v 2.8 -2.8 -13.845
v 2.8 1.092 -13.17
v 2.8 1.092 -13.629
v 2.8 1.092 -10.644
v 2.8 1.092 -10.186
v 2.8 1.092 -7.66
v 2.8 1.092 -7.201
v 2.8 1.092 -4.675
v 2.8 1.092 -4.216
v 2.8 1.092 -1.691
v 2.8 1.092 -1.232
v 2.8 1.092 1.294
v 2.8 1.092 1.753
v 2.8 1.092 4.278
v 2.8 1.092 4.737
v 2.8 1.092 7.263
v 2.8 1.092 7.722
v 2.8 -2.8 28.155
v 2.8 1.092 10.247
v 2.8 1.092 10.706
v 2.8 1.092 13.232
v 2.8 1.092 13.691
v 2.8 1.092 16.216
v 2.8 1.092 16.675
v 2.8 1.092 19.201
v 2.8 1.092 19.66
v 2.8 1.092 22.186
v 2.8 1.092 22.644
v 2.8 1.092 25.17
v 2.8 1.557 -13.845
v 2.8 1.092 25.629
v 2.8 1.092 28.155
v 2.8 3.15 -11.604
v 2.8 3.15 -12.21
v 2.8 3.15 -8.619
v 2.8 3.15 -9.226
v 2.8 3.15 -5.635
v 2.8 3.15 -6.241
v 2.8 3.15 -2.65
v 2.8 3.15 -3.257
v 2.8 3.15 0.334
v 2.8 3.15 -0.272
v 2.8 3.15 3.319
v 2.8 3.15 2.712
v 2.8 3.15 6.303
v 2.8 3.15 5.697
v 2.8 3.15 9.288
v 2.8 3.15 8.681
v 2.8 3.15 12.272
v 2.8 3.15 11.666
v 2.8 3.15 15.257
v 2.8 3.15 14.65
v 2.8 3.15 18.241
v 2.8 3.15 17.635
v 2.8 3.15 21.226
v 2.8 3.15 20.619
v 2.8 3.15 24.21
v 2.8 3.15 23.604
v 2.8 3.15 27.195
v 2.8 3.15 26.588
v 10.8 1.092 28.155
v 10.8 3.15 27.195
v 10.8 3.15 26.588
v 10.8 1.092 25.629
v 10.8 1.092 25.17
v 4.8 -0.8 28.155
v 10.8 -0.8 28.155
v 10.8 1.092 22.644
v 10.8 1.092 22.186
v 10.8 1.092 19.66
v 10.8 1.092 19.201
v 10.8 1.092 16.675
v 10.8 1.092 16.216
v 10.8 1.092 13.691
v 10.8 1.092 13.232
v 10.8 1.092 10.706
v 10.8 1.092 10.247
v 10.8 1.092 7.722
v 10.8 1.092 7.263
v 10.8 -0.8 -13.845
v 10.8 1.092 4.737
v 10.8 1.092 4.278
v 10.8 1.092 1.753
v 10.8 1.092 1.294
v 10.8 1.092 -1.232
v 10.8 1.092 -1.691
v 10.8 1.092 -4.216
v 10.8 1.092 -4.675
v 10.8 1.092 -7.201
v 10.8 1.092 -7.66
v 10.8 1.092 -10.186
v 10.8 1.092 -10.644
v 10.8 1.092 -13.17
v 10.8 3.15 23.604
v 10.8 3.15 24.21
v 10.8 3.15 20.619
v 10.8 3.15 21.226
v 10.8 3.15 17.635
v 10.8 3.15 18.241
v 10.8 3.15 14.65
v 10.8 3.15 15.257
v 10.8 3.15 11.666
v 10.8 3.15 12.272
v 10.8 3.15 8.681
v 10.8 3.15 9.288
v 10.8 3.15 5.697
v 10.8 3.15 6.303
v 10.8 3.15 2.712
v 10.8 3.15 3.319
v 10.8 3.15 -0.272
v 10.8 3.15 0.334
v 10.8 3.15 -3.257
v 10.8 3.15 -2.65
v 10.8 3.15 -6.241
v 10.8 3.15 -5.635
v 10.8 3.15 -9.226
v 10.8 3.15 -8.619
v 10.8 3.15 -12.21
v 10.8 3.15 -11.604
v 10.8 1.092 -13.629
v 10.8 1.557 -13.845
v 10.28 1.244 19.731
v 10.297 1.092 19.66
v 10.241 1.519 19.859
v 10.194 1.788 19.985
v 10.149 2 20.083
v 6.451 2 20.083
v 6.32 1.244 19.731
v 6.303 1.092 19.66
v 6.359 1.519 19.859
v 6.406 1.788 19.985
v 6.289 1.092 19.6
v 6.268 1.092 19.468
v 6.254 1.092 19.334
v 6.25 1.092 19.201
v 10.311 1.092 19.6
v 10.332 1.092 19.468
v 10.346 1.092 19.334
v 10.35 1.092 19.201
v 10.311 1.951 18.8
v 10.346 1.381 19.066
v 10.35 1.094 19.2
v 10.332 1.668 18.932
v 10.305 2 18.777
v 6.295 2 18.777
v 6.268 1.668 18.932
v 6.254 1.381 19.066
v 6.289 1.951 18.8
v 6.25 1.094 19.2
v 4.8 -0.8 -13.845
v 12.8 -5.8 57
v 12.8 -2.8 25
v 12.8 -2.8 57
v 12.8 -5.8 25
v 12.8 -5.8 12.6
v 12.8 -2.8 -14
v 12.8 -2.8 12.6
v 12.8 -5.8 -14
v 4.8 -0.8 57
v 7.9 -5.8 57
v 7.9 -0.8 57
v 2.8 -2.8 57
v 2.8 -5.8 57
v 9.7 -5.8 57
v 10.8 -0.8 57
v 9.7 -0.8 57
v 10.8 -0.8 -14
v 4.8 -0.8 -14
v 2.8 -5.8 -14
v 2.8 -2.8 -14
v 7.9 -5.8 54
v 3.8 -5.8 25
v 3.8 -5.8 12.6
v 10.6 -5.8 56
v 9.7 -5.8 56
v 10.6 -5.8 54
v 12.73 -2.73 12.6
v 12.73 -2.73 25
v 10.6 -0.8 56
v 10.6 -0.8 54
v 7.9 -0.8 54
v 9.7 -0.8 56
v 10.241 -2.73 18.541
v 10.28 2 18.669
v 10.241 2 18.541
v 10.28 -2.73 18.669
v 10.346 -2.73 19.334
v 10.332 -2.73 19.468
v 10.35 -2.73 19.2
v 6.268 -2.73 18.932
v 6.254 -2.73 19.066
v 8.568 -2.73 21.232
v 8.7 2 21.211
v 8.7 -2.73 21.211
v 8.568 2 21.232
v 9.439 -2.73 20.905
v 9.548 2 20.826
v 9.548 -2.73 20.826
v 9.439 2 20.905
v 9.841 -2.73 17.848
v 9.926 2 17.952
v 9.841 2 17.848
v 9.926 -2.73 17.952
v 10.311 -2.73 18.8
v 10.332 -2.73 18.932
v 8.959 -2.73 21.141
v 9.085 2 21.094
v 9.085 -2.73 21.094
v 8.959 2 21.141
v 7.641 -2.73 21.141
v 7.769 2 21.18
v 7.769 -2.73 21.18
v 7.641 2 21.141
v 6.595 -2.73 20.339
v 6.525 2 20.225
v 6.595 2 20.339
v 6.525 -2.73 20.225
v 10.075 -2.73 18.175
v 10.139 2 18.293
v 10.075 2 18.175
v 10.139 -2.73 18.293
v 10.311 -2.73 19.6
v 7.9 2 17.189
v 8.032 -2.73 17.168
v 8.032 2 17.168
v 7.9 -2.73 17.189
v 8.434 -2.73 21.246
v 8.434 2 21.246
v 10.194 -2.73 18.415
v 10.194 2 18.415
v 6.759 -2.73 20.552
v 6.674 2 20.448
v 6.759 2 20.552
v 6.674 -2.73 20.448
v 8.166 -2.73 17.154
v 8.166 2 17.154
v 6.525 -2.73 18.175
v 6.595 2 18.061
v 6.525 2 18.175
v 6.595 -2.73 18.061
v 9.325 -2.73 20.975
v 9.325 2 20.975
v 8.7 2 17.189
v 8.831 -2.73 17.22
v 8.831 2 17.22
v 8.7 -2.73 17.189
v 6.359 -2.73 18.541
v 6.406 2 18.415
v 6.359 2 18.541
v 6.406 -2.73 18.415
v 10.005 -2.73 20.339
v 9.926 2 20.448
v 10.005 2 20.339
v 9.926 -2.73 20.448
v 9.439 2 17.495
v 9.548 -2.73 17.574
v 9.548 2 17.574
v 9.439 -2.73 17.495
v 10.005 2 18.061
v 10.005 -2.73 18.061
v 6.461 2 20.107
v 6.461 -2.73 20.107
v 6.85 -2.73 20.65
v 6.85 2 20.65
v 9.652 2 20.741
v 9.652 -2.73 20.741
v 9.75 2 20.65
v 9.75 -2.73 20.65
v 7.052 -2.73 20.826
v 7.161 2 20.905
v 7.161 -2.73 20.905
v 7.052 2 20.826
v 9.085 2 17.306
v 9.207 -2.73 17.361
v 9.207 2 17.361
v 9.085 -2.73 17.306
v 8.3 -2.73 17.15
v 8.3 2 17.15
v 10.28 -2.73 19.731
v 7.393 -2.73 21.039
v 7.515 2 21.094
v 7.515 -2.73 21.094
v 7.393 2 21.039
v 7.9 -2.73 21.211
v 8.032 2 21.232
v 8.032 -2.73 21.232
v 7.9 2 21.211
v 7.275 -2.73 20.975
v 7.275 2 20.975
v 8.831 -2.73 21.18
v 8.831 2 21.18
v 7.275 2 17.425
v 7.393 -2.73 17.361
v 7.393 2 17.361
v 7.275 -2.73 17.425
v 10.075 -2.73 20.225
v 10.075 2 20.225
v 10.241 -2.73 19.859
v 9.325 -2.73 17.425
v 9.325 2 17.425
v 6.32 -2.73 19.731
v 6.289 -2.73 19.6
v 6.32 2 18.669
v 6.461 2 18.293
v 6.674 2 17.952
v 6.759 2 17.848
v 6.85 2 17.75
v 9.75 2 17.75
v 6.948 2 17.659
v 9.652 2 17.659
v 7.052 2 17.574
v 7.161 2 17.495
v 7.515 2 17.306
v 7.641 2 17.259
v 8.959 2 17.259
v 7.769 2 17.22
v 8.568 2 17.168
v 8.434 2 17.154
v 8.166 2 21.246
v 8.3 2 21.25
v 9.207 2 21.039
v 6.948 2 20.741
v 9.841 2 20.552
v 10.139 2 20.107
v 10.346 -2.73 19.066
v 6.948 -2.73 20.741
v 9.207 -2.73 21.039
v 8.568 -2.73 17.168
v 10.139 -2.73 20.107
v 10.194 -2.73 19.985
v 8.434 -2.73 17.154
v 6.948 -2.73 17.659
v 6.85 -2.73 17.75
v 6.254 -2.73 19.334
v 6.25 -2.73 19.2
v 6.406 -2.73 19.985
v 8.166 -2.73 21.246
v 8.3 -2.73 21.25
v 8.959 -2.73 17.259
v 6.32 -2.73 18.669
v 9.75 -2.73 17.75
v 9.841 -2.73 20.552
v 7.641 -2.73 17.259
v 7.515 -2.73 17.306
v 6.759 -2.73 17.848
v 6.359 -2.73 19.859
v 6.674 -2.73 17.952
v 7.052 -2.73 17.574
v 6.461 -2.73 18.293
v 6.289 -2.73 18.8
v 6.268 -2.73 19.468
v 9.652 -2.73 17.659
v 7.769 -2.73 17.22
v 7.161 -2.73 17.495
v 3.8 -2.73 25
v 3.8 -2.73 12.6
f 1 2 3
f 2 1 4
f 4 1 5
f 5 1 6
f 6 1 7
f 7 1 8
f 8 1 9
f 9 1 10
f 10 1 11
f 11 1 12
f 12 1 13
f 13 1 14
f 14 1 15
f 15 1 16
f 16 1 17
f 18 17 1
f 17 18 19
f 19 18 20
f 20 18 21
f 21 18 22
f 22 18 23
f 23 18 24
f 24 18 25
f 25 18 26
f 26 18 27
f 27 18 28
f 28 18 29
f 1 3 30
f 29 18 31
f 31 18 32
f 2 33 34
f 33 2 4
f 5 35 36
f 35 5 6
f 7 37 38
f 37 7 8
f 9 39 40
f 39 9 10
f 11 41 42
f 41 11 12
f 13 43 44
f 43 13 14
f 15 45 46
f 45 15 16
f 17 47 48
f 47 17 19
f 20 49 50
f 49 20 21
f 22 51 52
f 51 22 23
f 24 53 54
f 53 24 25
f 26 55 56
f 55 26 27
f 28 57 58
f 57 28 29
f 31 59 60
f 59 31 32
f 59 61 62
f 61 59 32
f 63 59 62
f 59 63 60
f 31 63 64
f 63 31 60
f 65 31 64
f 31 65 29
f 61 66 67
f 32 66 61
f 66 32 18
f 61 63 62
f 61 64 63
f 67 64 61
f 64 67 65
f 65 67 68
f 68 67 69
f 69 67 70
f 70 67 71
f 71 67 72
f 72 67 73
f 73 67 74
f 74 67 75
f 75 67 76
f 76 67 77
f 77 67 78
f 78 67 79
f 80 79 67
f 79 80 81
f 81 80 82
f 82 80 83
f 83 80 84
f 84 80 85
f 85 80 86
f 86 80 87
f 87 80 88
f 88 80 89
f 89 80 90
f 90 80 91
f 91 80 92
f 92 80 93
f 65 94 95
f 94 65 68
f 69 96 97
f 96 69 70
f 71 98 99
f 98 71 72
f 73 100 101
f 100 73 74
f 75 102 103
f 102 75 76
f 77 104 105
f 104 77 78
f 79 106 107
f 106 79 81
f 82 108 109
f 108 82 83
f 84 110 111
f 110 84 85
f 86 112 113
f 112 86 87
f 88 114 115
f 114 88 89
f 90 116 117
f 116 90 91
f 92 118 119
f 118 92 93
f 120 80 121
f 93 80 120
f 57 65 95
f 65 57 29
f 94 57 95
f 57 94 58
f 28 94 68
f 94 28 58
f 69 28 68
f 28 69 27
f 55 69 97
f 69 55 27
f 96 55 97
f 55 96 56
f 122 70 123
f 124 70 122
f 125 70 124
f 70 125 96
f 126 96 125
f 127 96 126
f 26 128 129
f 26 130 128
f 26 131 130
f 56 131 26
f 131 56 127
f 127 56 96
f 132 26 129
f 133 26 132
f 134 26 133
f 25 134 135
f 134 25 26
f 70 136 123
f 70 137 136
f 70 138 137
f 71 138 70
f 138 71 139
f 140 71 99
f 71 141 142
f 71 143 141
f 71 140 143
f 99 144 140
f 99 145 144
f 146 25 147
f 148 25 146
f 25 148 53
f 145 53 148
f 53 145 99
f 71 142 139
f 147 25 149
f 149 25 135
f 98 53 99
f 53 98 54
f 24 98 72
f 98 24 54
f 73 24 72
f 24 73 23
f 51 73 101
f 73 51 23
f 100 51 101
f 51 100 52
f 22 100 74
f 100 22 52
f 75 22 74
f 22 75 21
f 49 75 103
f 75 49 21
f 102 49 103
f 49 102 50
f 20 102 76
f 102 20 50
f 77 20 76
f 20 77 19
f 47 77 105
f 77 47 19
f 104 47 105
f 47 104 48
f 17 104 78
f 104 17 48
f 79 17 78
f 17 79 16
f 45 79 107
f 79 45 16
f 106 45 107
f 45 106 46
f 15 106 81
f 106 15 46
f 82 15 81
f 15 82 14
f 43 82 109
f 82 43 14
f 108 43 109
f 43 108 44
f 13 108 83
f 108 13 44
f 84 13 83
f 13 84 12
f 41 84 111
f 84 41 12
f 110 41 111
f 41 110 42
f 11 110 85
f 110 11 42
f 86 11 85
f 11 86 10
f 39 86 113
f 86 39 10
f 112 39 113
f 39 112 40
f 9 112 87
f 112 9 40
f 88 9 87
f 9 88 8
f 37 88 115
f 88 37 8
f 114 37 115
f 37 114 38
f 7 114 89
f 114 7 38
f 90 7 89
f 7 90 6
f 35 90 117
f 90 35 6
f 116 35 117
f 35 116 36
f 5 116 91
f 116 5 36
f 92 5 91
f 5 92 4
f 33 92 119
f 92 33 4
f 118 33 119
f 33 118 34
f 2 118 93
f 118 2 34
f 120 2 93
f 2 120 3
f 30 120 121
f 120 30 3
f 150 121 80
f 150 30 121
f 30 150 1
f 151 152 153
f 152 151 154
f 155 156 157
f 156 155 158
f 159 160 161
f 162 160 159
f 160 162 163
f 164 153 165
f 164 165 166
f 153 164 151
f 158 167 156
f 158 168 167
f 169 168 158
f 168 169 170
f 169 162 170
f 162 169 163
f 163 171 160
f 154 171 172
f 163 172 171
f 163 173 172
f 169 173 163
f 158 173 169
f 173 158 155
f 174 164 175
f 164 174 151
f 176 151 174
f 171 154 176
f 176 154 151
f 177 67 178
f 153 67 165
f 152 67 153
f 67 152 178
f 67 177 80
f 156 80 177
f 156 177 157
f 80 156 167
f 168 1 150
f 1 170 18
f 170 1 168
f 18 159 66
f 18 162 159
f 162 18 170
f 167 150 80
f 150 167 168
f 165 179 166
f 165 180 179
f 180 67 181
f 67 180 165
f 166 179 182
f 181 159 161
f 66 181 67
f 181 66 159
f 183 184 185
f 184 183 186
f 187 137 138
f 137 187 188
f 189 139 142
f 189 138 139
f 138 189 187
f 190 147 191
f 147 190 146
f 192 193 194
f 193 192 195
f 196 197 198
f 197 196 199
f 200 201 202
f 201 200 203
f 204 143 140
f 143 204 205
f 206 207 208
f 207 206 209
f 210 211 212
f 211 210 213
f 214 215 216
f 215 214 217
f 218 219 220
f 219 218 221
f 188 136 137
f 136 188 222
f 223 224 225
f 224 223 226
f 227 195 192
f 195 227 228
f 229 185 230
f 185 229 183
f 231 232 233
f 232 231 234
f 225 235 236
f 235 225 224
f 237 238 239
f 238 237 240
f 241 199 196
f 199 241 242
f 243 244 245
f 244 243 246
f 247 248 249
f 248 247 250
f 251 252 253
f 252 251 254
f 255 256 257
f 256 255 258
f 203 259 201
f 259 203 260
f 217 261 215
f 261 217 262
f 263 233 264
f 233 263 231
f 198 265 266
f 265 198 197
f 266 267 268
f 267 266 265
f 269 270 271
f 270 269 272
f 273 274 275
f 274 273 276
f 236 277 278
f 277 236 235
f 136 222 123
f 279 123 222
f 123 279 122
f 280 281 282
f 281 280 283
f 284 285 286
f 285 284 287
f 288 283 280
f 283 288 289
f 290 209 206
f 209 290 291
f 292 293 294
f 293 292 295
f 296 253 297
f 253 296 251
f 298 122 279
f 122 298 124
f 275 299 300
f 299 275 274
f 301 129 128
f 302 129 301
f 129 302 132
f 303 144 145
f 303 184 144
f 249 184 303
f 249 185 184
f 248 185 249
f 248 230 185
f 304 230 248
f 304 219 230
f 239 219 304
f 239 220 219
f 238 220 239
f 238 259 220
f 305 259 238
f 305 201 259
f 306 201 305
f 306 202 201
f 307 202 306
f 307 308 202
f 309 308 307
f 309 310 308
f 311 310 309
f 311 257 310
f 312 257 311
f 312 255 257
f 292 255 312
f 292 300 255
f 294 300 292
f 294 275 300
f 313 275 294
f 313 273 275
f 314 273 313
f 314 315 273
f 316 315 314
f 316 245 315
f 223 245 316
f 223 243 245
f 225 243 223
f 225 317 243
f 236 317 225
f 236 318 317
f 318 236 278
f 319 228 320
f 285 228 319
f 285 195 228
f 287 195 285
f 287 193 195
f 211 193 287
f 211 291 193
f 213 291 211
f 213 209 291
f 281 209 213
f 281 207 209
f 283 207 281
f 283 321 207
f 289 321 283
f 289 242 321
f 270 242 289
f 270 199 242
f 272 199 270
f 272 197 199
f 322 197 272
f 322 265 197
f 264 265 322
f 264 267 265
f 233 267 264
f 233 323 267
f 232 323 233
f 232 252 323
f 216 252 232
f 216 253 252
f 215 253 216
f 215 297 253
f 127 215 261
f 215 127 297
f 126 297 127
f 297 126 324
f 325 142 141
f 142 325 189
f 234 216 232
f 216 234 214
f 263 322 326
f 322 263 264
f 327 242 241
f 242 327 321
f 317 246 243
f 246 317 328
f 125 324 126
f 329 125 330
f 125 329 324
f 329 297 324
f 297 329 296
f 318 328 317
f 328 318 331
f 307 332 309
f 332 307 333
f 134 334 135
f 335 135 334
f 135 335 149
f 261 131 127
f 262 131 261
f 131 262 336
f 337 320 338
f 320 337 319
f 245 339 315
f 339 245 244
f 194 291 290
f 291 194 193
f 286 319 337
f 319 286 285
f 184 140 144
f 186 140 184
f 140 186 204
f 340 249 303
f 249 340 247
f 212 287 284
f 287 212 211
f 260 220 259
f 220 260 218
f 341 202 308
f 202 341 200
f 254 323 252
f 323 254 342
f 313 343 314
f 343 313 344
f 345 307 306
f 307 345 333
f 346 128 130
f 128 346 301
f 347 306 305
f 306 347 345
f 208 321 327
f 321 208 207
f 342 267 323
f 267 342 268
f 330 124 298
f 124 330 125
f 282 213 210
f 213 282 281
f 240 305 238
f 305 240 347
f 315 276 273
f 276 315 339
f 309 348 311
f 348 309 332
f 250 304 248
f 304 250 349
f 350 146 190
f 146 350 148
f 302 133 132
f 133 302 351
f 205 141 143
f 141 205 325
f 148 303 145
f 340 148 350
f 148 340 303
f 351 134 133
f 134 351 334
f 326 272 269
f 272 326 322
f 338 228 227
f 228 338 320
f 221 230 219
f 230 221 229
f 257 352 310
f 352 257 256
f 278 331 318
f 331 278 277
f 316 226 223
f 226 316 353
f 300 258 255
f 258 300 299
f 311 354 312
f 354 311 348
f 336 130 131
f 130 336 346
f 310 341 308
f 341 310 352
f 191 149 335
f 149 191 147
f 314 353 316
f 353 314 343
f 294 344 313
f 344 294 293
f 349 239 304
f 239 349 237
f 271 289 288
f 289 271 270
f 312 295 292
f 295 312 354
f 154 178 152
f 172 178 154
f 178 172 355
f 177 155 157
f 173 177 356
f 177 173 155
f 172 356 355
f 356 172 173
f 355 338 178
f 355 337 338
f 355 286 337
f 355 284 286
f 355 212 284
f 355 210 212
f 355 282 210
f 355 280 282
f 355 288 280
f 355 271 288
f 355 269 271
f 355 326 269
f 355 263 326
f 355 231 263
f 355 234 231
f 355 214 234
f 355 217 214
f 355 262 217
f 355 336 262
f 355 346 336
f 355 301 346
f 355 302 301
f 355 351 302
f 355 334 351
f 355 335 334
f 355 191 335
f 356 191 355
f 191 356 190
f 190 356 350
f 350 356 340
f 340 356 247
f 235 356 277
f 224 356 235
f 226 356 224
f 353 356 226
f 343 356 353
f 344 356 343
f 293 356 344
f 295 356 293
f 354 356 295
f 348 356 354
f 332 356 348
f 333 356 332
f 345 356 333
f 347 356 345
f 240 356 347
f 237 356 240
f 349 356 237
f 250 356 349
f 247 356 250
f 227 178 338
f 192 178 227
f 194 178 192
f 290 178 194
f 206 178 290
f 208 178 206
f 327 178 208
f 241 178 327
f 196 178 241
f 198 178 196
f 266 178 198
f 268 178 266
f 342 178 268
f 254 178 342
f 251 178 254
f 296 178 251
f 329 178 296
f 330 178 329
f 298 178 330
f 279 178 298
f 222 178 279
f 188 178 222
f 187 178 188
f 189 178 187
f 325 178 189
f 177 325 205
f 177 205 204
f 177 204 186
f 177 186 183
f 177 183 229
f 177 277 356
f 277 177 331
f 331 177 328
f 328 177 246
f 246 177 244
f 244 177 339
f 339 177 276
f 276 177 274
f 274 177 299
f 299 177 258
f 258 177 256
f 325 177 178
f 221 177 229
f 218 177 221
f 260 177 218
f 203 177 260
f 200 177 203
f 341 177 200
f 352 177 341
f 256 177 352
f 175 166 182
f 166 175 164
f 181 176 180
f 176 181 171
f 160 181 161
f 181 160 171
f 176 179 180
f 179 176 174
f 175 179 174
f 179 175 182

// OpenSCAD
$fn = 96;

// Redesigned and modified from https://www.thingiverse.com/thing:5719788
// Now available in OpenSCAD, for further modifications
// Gears from: https://www.thingiverse.com/thing:1604369
// Its mostly in german, but you should be ok...
// To Do:
// Implement gears as imported library

//color("DarkSlateGray") translate([-25,8,9.6]) rotate([90,0,90]) import("StepMotorModelScaled.stl");

//Z_rail ();
//Z_gearwheel ();
Z_rackpen (M3_insert); // M3_screwhole, M3_insert

//translate([25.5,-6.8+tight,18.5]) penHolder();
//translate([25.5,-6.8+tight,18.5]) brushInsert(6.5);
//handWheel();

//linear_extrude(32, center=true, scale=1) polygon(points=[[0,0],[2,2],[8,2],[10,0]]);


//color("fuchsia") translate([0,tight-0.2,15]) Z_rack ();
// Z-rack with mounatble penHolder
module Z_rackpen(lochli){
  translate([0,0,10]) difference(){
    color("fuchsia") translate([0,tight-0.2,15]) Z_rack ();
    #translate([dist+5.5,2,9.2]) rotate([90,0,0]) cylinder(21, d=lochli, center=false); // bigger hole for insert, uncomment if needed
    translate([dist+6,-6.68+tight,8.8]) cube([10,3.1,12.4], center = true); 
    translate([dist+6,-6.68+tight,50]) cube([1.8,18.1,12], center = true); 
    translate([dist+6.8,-6.68+tight,45]) cube([2.0,18.1,2], center = true); 
  }
}



// general shape of mechanism
round_edge = 4; // dont go more than 5
slide_tol = 0.6; // adjust this for tolerance
tight = 2.4; // Moves the rack closer to the wheel. Needs to be changed when gearwheel size changes
dist = 2.8; // i dont know what this parameter does...
overallHeight = 64; // not yet implemented

// gears and wheels
tooth_angle = 0;
tooth_size = 1; // modul = Height of the tooth tip above the pitch line
rackWidth = 8; // width of rack with teeth
rackDepth= 6; // depth of rack with teeth (some mistake when this is not 6)

// Pen Holder
pen_diam = 12;

// Holes and screws
M3_screwhole = 2.8; // tight to screw into it
M3_insert = 4.1;
M3_hole = 3.5; // loose to push screw through it
M3_screwhead = 5.8; // lower the screwhead into the material
M4_screwhole = 3.9; // tight to screw into it
Z_luft = 0.1; // increase size of shaft hole for z-wheel

module brushInsert(brushHole){
    difference(){
        union(){
            cylinder(h = 13, d = pen_diam-0.25, center = true);
            rotate([0,0,45]) translate([0,5.45,0]) cylinder(h = 13, d =1.8, center = true);
            rotate([0,0,45]) translate([5.45,0,0]) cylinder(h = 13, d =1.8, center = true);
        }
      cylinder(h = 22, d = brushHole, center = true);
      translate([0,-0,0]) rotate([90,0,0]) cylinder(14, d=4, center=false); // penholder-Holes
    }
}

module penHolder(){

    difference(){
        minkowski(){
        union(){            
            cylinder(h = 11, d =pen_diam+1, center = true);
            translate([0,-7,0]) rotate([90,0,0]) cylinder(h = 3, d =8, center = true);
          }
            $fn=30;
            sphere(d=2);  
        }
        cylinder(h = 23, d =pen_diam, center = true);
        rotate([0,0,45]) translate([0,5.5,0]) cylinder(h = 23, d =2, center = true);
        rotate([0,0,45]) translate([5.5,0,0]) cylinder(h = 23, d =2, center = true);

        translate([0,-2,0]) rotate([90,0,0]) cylinder(20, d=3.8, center=false); // penholder-Holes
    }


    difference(){
        union(){
            translate([-11.5,0,-0.8]) cube([12,3,11.3], center = true);
            translate([-14,-2.8,0]) rotate([90,0,0]) cylinder(h = 2.6, d =7, center = true);
        }
    #translate([-14,10,0]) rotate([90,0,0]) cylinder(20, d=3.2, center=false); 
        cylinder(h = 23, d =pen_diam, center = true);
        // penholder-Holes
    
    }
}

module handWheel() {
difference(){
    minkowski(){
        union(){
       cylinder(h = 1.5, d = 17, center = true);   
         
        }
            sphere(d=1.5); 
    }
    translate([0,-0,-2]) cylinder(14, d=3.7, center=false); // penholder-Holes
    }
    for (a =[0:45:360]){
        minkowski(){    
    rotate([0,0,a]) translate([0,-8,0]) cylinder(h = 3, d = 5, center = true); 
            sphere(d=0);
        }
    }
}

module Z_rail (){
difference(){
  minkowski(){
    union(){
        difference(){
            translate([1,-10,20+4]) cube([14-round_edge,10-round_edge,46+8-round_edge],center=true); // Vertikal
            translate([2,-18,2]) cube([20,50,32+8]);
            translate([2,-9,-12+2]) cube([20,50,30]);
            
        }
    translate([-3,8,8]) cube([6-round_edge,46-round_edge,12-round_edge],center=true); // Balken
    difference(){
            translate([8,-4,12+8]) cube([16-round_edge,22-round_edge,62+0-round_edge],center=true); // Z-Rail
            translate([10,7.0,36.5]) cube([28.0,10.1,30], center = true);
            translate([0,-18,2]) cube([20,50,40]);
            translate([0,-3+2,-32+0]) cube([20,50,60]);
           
        }
    }
    $fn=30;
    sphere(d=round_edge);
  }
 translate([rackWidth/2+dist+1,-rackDepth-0.5+tight-0.5*slide_tol,14]) cube([rackWidth+2+slide_tol,3+0.5*slide_tol,70+8],center=true); // Führung
  translate([rackWidth/2+dist,-2+tight-0.5*slide_tol,0]) cube([rackWidth+slide_tol,rackDepth+0.5*slide_tol,70],center=true); // Führung
  translate([rackWidth/2+dist-4,-4.55+tight-1*slide_tol,15.9]) rotate([0,0,0]) linear_extrude(78.2, center=true, scale=1) polygon(points=[[-slide_tol/2,0],[2,2+slide_tol/2],[8,2+slide_tol/2],[10+slide_tol/2,0]]);
  translate([-10,8,0]) rotate([0,90,0]) cylinder(20, d=12, center=false); // MotorCenter
  translate([-10,25.7,8.2]) rotate([0,90,0]) cylinder(20, d=3.5, center=false); // MotorScrewHoles
  translate([-2,25.7,8.2]) rotate([0,90,0]) cylinder(8.1, d=5.8, center=false); // MotorHolesHead
  translate([-10,-9.7,8.2]) rotate([0,90,0]) cylinder(20, d=3.5, center=false); // MotorScrewHoles
  translate([-2,-9.7,8.2]) rotate([0,90,0]) cylinder(8.1, d=5.8, center=false); // MotorScrewHead
  //Rubber Holder
  translate([14.4,-6.68+tight,36.7]) cube([1.5,28.1,12], center = true);
  translate([12,-6.68+tight+9.4,46.5]) rotate([0,-28,0]) cube([1.6,8.1,12], center = true);
  //translate([14,-6.68+tight-13,46.5]) rotate([0,-28,0]) cube([2.0,8.1,12], center = true);
  

}
}

module Z_rack (){
// Stange
translate([dist,0,-19]) rotate([0,90,0]) zahnstange(modul=1, laenge=42, hoehe=rackDepth, breite=rackWidth, eingriffswinkel=25, schraegungswinkel=tooth_angle);
translate([rackWidth/2+dist+1,-rackDepth-0.5,-3.5]) cube([rackWidth+2,3,64+7],center=true);
    translate([rackWidth/2+dist-4,-rackDepth+1,-3.5]) rotate([0,0,0]) linear_extrude(71, center=true, scale=1) polygon(points=[[0,0],[2,2],[8,2],[10,0]]);
    
}

module Z_gearwheel (){
// Stirnrad 
translate([10.5,8,0]) rotate([0,-90,0]) mirror([1,0,0]) difference(){
    stirnrad (modul=1, zahnzahl=12, breite=rackWidth, bohrung=0, eingriffswinkel=25, schraegungswinkel=tooth_angle, optimiert=true);
    shaft ();
    }
translate([-2,8,0]) rotate([0,90,0]) difference(){
    cylinder(10, d=9, center=false);
    shaft ();
    }
}

module old (){
color("PaleVioletRed") translate([6.2,2,15.5]) rotate([0,-90,0]) import("Holder_closed.stl");
color("fuchsia") translate([-4,0,0]) rotate([-90,0,0]) import("Z_rack.stl");
translate([36,-8,-16]) rotate([-90,0,90]) import("Z.stl");
color("HotPink") translate([10,14.5,2]) rotate([0,180,0]) import("Z_gear.stl");
color("DarkSlateGray") translate([5,14.5,-36]) rotate([0,0,90]) import("StepMotorModelScaled.stl");
}

module shaft (){
$fn=96;
  difference(){
    cylinder(h= 10, d=5+2*Z_luft, center= false);
    translate([-5,1.5+Z_luft,-1]) cube([10,10, 20]);
    translate([-5,-11.5-Z_luft,-1]) cube([10,10, 20]);
    }
}


/* Bibliothek für Evolventen-Zahnräder, Schnecken und Zahnstangen

Enthält die Module
- zahnstange(modul, laenge, hoehe, breite, eingriffswinkel=20, schraegungswinkel=0)
- stirnrad(modul, zahnzahl, breite, bohrung, eingriffswinkel=20, schraegungswinkel=0, optimiert=true)
- zahnstange_und_rad (modul, laenge_stange, zahnzahl_rad, hoehe_stange, bohrung_rad, breite, eingriffswinkel=20, schraegungswinkel=0, zusammen_gebaut=true, optimiert=true)


Beispiele für jedes Modul befinden sich auskommentiert am Ende dieser Datei

Autor:		Dr Jörg Janssen
Stand:		29. Oktober 2018
Version:	2.3
Lizenz:		Creative Commons - Attribution, Non Commercial, Share Alike

Erlaubte Module nach DIN 780:
0.05 0.06 0.08 0.10 0.12 0.16
0.20 0.25 0.3  0.4  0.5  0.6
0.7  0.8  0.9  1    1.25 1.5
2    2.5  3    4    5    6
8    10   12   16   20   25
32   40   50   60

*/

//translate([6,0,0]) rotate([0,90,0]) zahnstange_und_rad (modul=1.0, laenge_stange=70, zahnzahl_rad=15, hoehe_stange=6, bohrung_rad=1, breite=8, eingriffswinkel=25, schraegungswinkel=-10, zusammen_gebaut=true, optimiert=true);

// Allgemeine Variablen
pi = 3.14159;
rad = 57.29578;
spiel = 0.05;	// Spiel zwischen Zähnen

// zahnstange(modul=1, laenge=30, hoehe=5, breite=5, eingriffswinkel=20, schraegungswinkel=20);

// stirnrad (modul=1, zahnzahl=30, breite=5, bohrung=4, eingriffswinkel=20, schraegungswinkel=20, optimiert=true);

/*	Wandelt Radian in Grad um */
function grad(eingriffswinkel) = eingriffswinkel*rad;

/*	Wandelt Grad in Radian um */
function radian(eingriffswinkel) = eingriffswinkel/rad;

/*	Wandelt 2D-Polarkoordinaten in kartesische um
    Format: radius, phi; phi = Winkel zur x-Achse auf xy-Ebene */
function pol_zu_kart(polvect) = [
	polvect[0]*cos(polvect[1]),  
	polvect[0]*sin(polvect[1])
];

/*	Kreisevolventen-Funktion:
    Gibt die Polarkoordinaten einer Kreisevolvente aus
    r = Radius des Grundkreises
    rho = Abrollwinkel in Grad */
function ev(r,rho) = [
	r/cos(rho),
	grad(tan(rho)-radian(rho))
];

/*  Kugelevolventen-Funktion
    Gibt den Azimutwinkel einer Kugelevolvente aus
    theta0 = Polarwinkel des Kegels, an dessen Schnittkante zur Großkugel die Evolvente abrollt
    theta = Polarwinkel, für den der Azimutwinkel der Evolvente berechnet werden soll */
function kugelev(theta0,theta) = 1/sin(theta0)*acos(cos(theta)/cos(theta0))-acos(tan(theta0)/tan(theta));

/*  Wandelt Kugelkoordinaten in kartesische um
    Format: radius, theta, phi; theta = Winkel zu z-Achse, phi = Winkel zur x-Achse auf xy-Ebene */
function kugel_zu_kart(vect) = [
	vect[0]*sin(vect[1])*cos(vect[2]),  
	vect[0]*sin(vect[1])*sin(vect[2]),
	vect[0]*cos(vect[1])
];

/*	prüft, ob eine Zahl gerade ist
	= 1, wenn ja
	= 0, wenn die Zahl nicht gerade ist */
function istgerade(zahl) =
	(zahl == floor(zahl/2)*2) ? 1 : 0;

/*	größter gemeinsamer Teiler
	nach Euklidischem Algorithmus.
	Sortierung: a muss größer als b sein */
function ggt(a,b) = 
	a%b == 0 ? b : ggt(b,a%b);

/*	Polarfunktion mit polarwinkel und zwei variablen */
function spirale(a, r0, phi) =
	a*phi + r0; 

/*	Kopiert und dreht einen Körper */
module kopiere(vect, zahl, abstand, winkel){
	for(i = [0:zahl-1]){
		translate(v=vect*abstand*i)
			rotate(a=i*winkel, v = [0,0,1])
				children(0);
	}
}

/*  Zahnstange
    modul = Höhe des Zahnkopfes über der Wälzgeraden
    laenge = Länge der Zahnstange
    hoehe = Höhe der Zahnstange bis zur Wälzgeraden
    breite = Breite eines Zahns
    eingriffswinkel = Eingriffswinkel, Standardwert = 20° gemäß DIN 867. Sollte nicht größer als 45° sein.
    schraegungswinkel = Schrägungswinkel zur Zahnstangen-Querachse; 0° = Geradverzahnung */
module zahnstange(modul, laenge, hoehe, breite, eingriffswinkel = 20, schraegungswinkel = 0) {

	// Dimensions-Berechnungen
	modul=modul*(1-spiel);
	c = modul / 6;												// Kopfspiel
	mx = modul/cos(schraegungswinkel);							// Durch Schrägungswinkel verzerrtes modul in x-Richtung
	a = 2*mx*tan(eingriffswinkel)+c*tan(eingriffswinkel);		// Flankenbreite
	b = pi*mx/2-2*mx*tan(eingriffswinkel);						// Kopfbreite
	x = breite*tan(schraegungswinkel);							// Verschiebung der Oberseite in x-Richtung durch Schrägungswinkel
	nz = ceil((laenge+abs(2*x))/(pi*mx));						// Anzahl der Zähne
	
	translate([-pi*mx*(nz-1)/2-a-b/2,-modul,0]){
		intersection(){											// Erzeugt ein Prisma, das in eine Quadergeometrie eingepasst wird
			kopiere([1,0,0], nz, pi*mx, 0){
				polyhedron(
					points=[[0,-c,0], [a,2*modul,0], [a+b,2*modul,0], [2*a+b,-c,0], [pi*mx,-c,0], [pi*mx,modul-hoehe,0], [0,modul-hoehe,0],	// Unterseite
						[0+x,-c,breite], [a+x,2*modul,breite], [a+b+x,2*modul,breite], [2*a+b+x,-c,breite], [pi*mx+x,-c,breite], [pi*mx+x,modul-hoehe,breite], [0+x,modul-hoehe,breite]],	// Oberseite
					faces=[[6,5,4,3,2,1,0],						// Unterseite
						[1,8,7,0],
						[9,8,1,2],
						[10,9,2,3],
						[11,10,3,4],
						[12,11,4,5],
						[13,12,5,6],
						[7,13,6,0],
						[7,8,9,10,11,12,13],					// Oberseite
					]
				);
			};
			translate([abs(x),-hoehe+modul-0.5,-0.5]){
				cube([laenge,hoehe+modul+1,breite+1]);			// Quader, der das Volumen der Zahnstange umfasst
			}	
		};
	};	
}

/*  Stirnrad
    modul = Höhe des Zahnkopfes über dem Teilkreis
    zahnzahl = Anzahl der Radzähne
    breite = Zahnbreite
    bohrung = Durchmesser der Mittelbohrung
    eingriffswinkel = Eingriffswinkel, Standardwert = 20° gemäß DIN 867. Sollte nicht größer als 45° sein.
    schraegungswinkel = Schrägungswinkel zur Rotationsachse; 0° = Geradverzahnung
	optimiert = Löcher zur Material-/Gewichtsersparnis bzw. Oberflächenvergößerung erzeugen, wenn Geometrie erlaubt */
module stirnrad(modul, zahnzahl, breite, bohrung, eingriffswinkel = 20, schraegungswinkel = 0, optimiert = true) {

	// Dimensions-Berechnungen	
	d = modul * zahnzahl;											// Teilkreisdurchmesser
	r = d / 2;														// Teilkreisradius
	alpha_stirn = atan(tan(eingriffswinkel)/cos(schraegungswinkel));// Schrägungswinkel im Stirnschnitt
	db = d * cos(alpha_stirn);										// Grundkreisdurchmesser
	rb = db / 2;													// Grundkreisradius
	da = (modul <1)? d + modul * 2.2 : d + modul * 2;				// Kopfkreisdurchmesser nach DIN 58400 bzw. DIN 867
	ra = da / 2;													// Kopfkreisradius
	c =  (zahnzahl <3)? 0 : modul/6;								// Kopfspiel
	df = d - 2 * (modul + c);										// Fußkreisdurchmesser
	rf = df / 2;													// Fußkreisradius
	rho_ra = acos(rb/ra);											// maximaler Abrollwinkel;
																	// Evolvente beginnt auf Grundkreis und endet an Kopfkreis
	rho_r = acos(rb/r);												// Abrollwinkel am Teilkreis;
																	// Evolvente beginnt auf Grundkreis und endet an Kopfkreis
	phi_r = grad(tan(rho_r)-radian(rho_r));							// Winkel zum Punkt der Evolvente auf Teilkreis
	gamma = rad*breite/(r*tan(90-schraegungswinkel));				// Torsionswinkel für Extrusion
	schritt = rho_ra/16;											// Evolvente wird in 16 Stücke geteilt
	tau = 360/zahnzahl;												// Teilungswinkel
	
	r_loch = (2*rf - bohrung)/8;									// Radius der Löcher für Material-/Gewichtsersparnis
	rm = bohrung/2+2*r_loch;										// Abstand der Achsen der Löcher von der Hauptachse
	z_loch = floor(2*pi*rm/(3*r_loch));								// Anzahl der Löcher für Material-/Gewichtsersparnis
	
	optimiert = (optimiert && r >= breite*1.5 && d > 2*bohrung);	// ist Optimierung sinnvoll?

	// Zeichnung
	union(){
		rotate([0,0,-phi_r-90*(1-spiel)/zahnzahl]){						// Zahn auf x-Achse zentrieren;
																		// macht Ausrichtung mit anderen Rädern einfacher

			linear_extrude(height = breite, twist = gamma){
				difference(){
					union(){
						zahnbreite = (180*(1-spiel))/zahnzahl+2*phi_r;
						circle(rf);										// Fußkreis	
						for (rot = [0:tau:360]){
							rotate (rot){								// "Zahnzahl-mal" kopieren und drehen
								polygon(concat(							// Zahn
									[[0,0]],							// Zahnsegment beginnt und endet im Ursprung
									[for (rho = [0:schritt:rho_ra])		// von null Grad (Grundkreis)
																		// bis maximalen Evolventenwinkel (Kopfkreis)
										pol_zu_kart(ev(rb,rho))],		// Erste Evolventen-Flanke

									[pol_zu_kart(ev(rb,rho_ra))],		// Punkt der Evolvente auf Kopfkreis

									[for (rho = [rho_ra:-schritt:0])	// von maximalen Evolventenwinkel (Kopfkreis)
																		// bis null Grad (Grundkreis)
										pol_zu_kart([ev(rb,rho)[0], zahnbreite-ev(rb,rho)[1]])]
																		// Zweite Evolventen-Flanke
																		// (180*(1-spiel)) statt 180 Grad,
																		// um Spiel an den Flanken zu erlauben
									)
								);
							}
						}
					}			
					circle(r = rm+r_loch*1.49);							// "Bohrung"
				}
			}
		}
		// mit Materialersparnis
		if (optimiert) {
			linear_extrude(height = breite){
				difference(){
						circle(r = (bohrung+r_loch)/2);
						circle(r = bohrung/2);							// Bohrung
					}
				}
			linear_extrude(height = (breite-r_loch/2 < breite*2/3) ? breite*2/3 : breite-r_loch/2){
				difference(){
					circle(r=rm+r_loch*1.51);
					union(){
						circle(r=(bohrung+r_loch)/2);
						for (i = [0:1:z_loch]){
							translate(kugel_zu_kart([rm,90,i*360/z_loch]))
								circle(r = r_loch);
						}
					}
				}
			}
		}
		// ohne Materialersparnis
		else {
			linear_extrude(height = breite){
				difference(){
					circle(r = rm+r_loch*1.51);
					circle(r = bohrung/2);
				}
			}
		}
	}
}


/*	Zahnstange und -Rad
    modul = Höhe des Zahnkopfes über dem Teilkreis
    laenge_stange = Laenge der Zahnstange
    zahnzahl_rad = Anzahl der Radzähne
	hoehe_stange = Höhe der Zahnstange bis zur Wälzgeraden
    bohrung_rad = Durchmesser der Mittelbohrung des Stirnrads
	breite = Breite eines Zahns
    eingriffswinkel = Eingriffswinkel, Standardwert = 20° gemäß DIN 867. Sollte nicht größer als 45° sein.
    schraegungswinkel = Schrägungswinkel zur Rotationsachse, Standardwert = 0° (Geradverzahnung) */
module zahnstange_und_rad (modul, laenge_stange, zahnzahl_rad, hoehe_stange, bohrung_rad, breite, eingriffswinkel=20, schraegungswinkel=0, zusammen_gebaut=true, optimiert=true) {

	abstand = zusammen_gebaut? modul*zahnzahl_rad/2 : modul*zahnzahl_rad;

	zahnstange(modul, laenge_stange, hoehe_stange, breite, eingriffswinkel, -schraegungswinkel);
	translate([0,abstand,0])
		rotate(a=360/zahnzahl_rad)
			stirnrad (modul, zahnzahl_rad, breite, bohrung_rad, eingriffswinkel, schraegungswinkel, optimiert);
}
